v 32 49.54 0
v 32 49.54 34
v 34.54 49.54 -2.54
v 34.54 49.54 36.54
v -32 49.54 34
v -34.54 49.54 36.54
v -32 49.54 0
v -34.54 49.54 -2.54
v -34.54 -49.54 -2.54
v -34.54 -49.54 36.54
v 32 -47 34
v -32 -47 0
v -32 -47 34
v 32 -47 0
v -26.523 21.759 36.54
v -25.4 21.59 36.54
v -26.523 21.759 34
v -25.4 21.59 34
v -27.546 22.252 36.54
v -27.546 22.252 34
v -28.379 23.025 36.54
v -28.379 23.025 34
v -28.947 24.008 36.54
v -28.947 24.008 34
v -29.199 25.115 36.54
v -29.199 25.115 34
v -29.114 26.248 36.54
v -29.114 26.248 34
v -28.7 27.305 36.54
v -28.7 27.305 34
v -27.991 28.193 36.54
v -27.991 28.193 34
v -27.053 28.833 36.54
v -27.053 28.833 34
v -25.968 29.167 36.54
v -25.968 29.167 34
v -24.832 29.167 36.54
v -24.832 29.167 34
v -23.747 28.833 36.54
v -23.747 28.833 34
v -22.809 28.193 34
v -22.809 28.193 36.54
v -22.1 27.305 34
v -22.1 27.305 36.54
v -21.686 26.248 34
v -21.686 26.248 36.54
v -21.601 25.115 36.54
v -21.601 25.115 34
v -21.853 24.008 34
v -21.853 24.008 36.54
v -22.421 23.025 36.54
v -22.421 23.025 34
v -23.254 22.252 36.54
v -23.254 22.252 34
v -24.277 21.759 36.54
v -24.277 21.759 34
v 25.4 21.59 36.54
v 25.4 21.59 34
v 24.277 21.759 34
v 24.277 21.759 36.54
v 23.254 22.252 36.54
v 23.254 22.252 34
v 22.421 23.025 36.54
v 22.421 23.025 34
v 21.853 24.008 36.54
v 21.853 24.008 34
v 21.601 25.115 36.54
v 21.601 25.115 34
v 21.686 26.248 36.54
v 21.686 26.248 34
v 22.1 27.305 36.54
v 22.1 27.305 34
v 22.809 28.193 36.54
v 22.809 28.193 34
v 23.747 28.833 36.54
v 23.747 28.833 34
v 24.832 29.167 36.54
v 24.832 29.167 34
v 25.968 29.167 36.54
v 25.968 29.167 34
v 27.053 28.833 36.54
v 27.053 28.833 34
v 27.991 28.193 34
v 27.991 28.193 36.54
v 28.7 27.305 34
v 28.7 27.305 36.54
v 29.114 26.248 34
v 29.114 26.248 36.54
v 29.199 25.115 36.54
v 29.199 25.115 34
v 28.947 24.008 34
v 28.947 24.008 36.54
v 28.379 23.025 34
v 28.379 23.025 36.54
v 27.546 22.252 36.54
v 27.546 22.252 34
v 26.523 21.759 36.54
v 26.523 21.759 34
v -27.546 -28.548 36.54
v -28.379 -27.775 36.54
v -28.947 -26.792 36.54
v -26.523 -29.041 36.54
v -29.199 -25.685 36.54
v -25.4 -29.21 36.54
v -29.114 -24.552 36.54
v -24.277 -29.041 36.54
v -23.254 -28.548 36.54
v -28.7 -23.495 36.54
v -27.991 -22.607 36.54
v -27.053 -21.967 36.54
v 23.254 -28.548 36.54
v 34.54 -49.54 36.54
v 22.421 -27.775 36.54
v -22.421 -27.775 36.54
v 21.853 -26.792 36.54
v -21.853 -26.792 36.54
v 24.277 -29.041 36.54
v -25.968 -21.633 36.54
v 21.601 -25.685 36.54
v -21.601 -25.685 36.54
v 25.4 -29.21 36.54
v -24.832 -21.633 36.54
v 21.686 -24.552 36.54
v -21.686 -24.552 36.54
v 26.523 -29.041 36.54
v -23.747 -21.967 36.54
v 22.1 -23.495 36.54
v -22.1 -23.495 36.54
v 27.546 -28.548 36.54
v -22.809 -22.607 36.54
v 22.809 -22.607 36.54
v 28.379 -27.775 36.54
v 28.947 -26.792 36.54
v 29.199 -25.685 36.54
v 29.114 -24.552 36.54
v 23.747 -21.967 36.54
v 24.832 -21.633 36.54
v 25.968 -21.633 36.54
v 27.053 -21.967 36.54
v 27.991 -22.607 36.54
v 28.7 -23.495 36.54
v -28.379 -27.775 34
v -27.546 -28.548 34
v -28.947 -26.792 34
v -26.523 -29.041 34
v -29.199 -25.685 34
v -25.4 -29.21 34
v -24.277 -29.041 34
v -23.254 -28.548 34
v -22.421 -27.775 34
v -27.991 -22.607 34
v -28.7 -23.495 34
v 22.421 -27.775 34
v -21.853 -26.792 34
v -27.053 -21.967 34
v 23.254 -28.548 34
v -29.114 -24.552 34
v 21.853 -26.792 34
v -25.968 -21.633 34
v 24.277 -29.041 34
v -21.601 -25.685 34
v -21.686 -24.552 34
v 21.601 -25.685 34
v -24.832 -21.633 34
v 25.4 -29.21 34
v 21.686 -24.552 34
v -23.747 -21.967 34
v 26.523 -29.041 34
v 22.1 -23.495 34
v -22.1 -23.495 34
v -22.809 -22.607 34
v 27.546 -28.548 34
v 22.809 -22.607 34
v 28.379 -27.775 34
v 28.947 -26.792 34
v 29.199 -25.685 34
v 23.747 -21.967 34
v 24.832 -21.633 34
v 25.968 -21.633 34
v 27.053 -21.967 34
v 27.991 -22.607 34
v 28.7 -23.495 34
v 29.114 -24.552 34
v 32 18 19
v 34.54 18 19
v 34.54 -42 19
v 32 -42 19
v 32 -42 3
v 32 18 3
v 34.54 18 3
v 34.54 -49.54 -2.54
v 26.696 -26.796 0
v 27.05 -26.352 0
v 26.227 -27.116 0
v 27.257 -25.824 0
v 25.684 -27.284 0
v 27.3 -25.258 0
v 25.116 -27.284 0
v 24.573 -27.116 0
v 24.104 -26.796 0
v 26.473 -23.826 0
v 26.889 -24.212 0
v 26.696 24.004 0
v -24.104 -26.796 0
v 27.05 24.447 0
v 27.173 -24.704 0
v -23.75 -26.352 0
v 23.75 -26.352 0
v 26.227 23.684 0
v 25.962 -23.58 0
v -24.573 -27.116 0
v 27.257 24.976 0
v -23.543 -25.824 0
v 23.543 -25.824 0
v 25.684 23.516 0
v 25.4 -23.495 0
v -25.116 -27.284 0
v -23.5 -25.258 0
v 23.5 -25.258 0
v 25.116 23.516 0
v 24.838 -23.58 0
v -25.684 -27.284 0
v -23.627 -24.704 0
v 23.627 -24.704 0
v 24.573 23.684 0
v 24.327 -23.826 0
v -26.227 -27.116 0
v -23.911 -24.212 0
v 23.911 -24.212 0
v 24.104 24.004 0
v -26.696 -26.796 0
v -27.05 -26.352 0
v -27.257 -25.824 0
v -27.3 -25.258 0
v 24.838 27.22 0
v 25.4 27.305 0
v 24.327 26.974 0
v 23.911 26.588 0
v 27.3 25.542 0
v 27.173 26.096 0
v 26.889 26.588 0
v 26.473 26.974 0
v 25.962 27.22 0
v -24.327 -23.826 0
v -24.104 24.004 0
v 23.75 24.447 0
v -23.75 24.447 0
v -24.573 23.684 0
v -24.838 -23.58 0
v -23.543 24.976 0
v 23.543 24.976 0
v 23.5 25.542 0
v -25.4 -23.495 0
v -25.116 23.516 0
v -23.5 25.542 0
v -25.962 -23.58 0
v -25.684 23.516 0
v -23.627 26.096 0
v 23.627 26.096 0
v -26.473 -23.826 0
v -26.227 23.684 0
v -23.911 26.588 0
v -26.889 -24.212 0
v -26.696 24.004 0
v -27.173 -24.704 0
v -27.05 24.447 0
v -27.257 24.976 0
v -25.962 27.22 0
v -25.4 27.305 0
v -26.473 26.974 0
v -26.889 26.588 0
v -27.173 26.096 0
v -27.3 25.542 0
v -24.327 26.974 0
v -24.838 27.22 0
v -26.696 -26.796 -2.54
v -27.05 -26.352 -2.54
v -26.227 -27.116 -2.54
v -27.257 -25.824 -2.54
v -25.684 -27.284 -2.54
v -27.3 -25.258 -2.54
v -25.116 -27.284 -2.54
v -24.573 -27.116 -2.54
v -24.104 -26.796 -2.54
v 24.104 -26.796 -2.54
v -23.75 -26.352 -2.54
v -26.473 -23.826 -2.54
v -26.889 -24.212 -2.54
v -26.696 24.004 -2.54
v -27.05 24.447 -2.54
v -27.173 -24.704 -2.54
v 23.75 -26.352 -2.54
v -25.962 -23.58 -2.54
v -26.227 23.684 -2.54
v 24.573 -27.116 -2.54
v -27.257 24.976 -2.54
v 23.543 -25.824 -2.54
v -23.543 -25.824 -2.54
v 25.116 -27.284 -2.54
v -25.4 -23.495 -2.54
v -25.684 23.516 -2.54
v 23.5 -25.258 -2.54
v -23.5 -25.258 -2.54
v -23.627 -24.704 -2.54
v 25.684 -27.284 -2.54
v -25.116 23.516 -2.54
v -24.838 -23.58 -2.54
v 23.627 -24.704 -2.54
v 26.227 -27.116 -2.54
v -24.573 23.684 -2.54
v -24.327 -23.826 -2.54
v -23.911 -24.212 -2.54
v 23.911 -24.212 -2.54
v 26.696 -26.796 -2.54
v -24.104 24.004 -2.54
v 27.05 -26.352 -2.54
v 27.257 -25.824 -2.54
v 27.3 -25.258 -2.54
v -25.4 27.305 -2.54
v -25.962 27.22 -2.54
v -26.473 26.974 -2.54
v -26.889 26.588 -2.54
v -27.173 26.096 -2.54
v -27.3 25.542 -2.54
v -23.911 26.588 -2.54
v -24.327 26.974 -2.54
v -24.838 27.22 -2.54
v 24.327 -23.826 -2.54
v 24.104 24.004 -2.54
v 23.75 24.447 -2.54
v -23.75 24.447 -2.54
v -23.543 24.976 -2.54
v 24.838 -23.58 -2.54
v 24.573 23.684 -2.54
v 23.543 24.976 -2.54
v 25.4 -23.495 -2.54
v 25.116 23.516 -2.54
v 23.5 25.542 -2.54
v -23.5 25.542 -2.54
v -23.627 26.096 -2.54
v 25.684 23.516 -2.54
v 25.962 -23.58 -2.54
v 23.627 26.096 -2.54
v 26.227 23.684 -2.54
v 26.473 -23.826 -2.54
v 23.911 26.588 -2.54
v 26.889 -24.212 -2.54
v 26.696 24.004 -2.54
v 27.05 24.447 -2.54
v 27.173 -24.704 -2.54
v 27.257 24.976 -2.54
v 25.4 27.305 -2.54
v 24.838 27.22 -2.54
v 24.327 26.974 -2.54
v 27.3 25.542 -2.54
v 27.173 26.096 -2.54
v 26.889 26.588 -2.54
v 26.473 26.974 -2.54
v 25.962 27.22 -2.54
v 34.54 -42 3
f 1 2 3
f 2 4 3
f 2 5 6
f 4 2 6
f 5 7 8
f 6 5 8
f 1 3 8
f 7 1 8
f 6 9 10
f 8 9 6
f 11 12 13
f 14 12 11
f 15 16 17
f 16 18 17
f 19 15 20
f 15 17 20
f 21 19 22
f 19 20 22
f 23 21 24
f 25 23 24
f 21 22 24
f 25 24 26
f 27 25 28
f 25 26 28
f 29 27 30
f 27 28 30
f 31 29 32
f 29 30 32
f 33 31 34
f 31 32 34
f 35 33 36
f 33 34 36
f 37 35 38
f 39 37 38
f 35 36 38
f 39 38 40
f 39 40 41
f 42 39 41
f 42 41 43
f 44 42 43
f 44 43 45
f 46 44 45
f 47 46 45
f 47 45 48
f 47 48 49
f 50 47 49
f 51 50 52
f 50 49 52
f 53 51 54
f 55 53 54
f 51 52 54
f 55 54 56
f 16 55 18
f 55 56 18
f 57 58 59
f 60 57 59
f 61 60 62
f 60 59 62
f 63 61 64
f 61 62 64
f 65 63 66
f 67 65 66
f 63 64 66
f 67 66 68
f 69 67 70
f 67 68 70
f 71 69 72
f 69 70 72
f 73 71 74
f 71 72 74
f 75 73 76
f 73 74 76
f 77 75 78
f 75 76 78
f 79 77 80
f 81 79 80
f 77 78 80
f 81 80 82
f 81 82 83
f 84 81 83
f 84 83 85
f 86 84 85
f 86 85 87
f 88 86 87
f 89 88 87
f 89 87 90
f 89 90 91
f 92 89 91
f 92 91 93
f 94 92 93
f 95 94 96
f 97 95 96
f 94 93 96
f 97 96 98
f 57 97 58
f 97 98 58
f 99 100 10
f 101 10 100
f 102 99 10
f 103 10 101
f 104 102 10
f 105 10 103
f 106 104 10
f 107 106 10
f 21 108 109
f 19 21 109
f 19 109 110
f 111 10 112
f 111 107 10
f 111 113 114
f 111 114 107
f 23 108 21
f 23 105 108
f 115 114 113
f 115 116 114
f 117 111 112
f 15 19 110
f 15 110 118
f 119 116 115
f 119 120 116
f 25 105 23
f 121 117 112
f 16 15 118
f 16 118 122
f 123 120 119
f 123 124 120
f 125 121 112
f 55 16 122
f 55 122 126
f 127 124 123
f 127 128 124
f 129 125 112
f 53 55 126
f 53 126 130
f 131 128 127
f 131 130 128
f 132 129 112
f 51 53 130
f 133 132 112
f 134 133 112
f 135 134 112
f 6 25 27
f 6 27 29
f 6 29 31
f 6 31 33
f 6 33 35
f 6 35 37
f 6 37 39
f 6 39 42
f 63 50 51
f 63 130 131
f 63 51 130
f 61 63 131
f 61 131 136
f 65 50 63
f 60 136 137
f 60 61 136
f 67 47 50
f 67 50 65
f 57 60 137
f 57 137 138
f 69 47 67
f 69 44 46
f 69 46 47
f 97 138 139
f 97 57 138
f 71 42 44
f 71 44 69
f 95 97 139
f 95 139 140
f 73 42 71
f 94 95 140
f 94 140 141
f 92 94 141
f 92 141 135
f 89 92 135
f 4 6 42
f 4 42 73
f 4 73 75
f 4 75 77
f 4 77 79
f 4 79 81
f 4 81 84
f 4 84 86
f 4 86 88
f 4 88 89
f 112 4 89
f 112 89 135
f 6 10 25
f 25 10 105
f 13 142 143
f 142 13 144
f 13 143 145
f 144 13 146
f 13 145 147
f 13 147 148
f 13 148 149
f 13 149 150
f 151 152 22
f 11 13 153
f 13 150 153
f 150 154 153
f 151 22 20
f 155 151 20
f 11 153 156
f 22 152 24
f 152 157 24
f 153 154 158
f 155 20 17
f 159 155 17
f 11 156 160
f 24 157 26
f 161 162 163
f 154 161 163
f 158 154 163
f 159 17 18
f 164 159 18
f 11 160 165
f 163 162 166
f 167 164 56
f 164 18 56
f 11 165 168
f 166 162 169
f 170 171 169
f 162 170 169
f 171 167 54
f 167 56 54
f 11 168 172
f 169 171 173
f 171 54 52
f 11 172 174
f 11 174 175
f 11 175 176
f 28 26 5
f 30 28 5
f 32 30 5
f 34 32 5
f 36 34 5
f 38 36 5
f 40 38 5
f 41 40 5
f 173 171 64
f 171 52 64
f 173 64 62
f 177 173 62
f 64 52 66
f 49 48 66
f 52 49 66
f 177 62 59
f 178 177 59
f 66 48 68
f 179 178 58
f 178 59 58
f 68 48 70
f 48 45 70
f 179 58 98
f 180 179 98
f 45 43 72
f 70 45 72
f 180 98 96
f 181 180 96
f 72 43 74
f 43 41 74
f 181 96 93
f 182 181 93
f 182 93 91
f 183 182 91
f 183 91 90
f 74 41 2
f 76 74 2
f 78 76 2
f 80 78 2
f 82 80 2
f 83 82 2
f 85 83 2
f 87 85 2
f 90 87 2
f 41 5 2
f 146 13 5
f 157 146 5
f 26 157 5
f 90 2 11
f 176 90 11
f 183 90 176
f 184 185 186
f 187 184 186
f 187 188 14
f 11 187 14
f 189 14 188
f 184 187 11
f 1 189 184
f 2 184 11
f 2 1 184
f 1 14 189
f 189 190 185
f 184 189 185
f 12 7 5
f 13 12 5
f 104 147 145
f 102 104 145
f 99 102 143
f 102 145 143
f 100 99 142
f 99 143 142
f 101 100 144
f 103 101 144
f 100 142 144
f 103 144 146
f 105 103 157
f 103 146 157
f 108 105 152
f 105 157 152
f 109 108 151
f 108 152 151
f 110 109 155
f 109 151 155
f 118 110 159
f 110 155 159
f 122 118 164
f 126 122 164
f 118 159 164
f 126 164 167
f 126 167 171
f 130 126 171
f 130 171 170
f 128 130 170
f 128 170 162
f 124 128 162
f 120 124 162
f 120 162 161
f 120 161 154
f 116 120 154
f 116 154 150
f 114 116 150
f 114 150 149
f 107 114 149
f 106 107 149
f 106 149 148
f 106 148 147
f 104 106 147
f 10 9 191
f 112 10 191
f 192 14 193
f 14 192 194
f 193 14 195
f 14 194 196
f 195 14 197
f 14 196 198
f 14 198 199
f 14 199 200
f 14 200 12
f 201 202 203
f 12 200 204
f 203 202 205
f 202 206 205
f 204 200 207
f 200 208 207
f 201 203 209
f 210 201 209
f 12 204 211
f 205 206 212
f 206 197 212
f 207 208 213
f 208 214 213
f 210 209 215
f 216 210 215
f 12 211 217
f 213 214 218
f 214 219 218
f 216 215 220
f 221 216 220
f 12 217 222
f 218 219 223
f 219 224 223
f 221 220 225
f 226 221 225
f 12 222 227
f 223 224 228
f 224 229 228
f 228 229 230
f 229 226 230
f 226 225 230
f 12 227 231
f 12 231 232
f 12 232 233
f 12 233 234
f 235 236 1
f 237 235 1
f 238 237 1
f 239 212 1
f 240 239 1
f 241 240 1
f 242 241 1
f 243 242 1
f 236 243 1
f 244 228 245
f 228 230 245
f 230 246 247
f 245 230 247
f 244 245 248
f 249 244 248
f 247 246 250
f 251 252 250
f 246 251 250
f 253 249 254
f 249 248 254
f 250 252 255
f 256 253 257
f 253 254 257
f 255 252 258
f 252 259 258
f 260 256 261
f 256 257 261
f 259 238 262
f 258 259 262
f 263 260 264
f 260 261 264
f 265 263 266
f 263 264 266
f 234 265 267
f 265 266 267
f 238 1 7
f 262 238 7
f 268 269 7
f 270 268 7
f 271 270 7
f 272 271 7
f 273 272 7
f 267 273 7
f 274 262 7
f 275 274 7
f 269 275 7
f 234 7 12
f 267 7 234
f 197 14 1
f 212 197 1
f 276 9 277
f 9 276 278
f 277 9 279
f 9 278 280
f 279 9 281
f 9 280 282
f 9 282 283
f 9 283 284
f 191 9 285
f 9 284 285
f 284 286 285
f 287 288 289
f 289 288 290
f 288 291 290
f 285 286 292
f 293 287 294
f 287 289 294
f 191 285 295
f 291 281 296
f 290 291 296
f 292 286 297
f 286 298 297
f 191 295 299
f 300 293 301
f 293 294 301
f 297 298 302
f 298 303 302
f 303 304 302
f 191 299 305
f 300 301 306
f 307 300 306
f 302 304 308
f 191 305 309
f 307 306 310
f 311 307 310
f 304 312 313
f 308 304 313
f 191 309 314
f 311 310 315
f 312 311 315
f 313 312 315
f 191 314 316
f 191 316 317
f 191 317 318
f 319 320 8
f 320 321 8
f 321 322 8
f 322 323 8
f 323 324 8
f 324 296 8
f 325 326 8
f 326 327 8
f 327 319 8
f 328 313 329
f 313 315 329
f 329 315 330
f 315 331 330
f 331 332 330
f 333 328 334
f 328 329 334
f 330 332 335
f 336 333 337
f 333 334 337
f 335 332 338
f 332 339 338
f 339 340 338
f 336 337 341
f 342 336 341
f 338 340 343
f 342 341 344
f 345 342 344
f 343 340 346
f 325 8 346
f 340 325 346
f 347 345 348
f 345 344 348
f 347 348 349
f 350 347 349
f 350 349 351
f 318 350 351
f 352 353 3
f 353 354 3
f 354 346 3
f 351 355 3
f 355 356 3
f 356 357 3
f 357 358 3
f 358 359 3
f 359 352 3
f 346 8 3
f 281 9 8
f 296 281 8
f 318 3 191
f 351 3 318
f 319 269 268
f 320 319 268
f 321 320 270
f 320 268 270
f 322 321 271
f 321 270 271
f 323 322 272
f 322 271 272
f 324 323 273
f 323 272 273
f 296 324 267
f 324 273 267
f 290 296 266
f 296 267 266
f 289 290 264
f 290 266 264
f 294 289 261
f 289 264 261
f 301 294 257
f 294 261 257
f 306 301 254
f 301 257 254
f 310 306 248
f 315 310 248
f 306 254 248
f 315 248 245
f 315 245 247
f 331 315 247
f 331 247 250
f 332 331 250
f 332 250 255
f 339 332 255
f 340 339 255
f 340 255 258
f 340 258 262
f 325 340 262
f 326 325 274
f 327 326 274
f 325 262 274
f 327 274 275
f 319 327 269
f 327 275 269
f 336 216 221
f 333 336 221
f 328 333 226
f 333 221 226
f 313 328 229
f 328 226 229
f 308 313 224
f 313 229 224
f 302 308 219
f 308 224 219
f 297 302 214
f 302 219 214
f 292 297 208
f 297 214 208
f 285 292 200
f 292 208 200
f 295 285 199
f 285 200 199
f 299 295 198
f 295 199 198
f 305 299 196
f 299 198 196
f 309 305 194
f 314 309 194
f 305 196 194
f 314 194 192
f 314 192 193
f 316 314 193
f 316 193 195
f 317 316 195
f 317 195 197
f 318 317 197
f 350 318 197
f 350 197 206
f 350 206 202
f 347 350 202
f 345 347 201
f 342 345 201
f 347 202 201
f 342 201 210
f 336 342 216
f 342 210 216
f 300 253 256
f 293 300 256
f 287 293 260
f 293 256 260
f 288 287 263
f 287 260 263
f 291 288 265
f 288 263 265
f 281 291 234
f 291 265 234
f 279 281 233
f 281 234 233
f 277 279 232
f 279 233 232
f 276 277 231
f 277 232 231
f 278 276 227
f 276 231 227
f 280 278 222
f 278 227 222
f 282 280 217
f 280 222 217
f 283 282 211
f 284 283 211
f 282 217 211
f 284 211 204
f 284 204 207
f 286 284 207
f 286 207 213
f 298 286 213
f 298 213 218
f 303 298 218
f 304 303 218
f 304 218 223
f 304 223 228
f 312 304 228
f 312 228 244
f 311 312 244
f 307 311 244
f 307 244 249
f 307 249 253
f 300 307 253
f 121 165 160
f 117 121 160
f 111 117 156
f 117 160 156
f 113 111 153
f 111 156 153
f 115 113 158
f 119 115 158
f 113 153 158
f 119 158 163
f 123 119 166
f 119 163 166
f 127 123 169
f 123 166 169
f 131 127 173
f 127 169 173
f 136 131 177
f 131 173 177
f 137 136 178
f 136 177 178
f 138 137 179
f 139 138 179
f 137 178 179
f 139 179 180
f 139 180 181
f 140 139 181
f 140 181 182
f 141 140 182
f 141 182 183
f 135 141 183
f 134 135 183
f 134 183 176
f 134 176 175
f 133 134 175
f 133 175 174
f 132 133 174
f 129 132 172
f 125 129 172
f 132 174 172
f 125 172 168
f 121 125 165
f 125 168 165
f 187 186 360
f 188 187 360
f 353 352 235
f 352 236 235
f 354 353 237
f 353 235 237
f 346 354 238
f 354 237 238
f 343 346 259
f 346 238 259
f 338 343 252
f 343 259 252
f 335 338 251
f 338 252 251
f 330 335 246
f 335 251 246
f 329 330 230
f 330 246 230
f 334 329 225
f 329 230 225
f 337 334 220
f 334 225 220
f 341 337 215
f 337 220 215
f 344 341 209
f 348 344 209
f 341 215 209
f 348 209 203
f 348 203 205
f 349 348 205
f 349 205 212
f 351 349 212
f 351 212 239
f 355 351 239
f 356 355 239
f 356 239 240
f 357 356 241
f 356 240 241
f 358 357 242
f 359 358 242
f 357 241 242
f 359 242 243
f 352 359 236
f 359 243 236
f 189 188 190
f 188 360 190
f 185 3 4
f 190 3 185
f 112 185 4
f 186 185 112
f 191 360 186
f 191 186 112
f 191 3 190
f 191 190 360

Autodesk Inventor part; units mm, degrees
ref_plane "YZ Plane" through (0, 0, 0) normal (1, 0, 0) x (0, 1, 0)
ref_plane "XZ Plane" through (0, 0, 0) normal (0, 1, 0) x (-1, 0, 0)
ref_plane "XY Plane" through (0, 0, 0) normal (0, 0, 1) x (1, 0, 0)
sketch "Sketch14" plane through (0, 0, 0) normal (0, 0, 1) x (1, 0, 0)
  line L0 (-34.54, -49.54) -> (34.54, -49.54)
  line L1 (34.54, -49.54) -> (34.54, 49.54)
  line L2 (34.54, 49.54) -> (-34.54, 49.54)
  line L3 (-34.54, 49.54) -> (-34.54, -49.54)
  line L4 (-34.54, -49.54) -> (34.54, 49.54) construction
  line L5 (34.54, -49.54) -> (-34.54, 49.54) construction
  point P0 (0, 0)
  dimension "d66" = 69.08
  dimension "d67" = 99.08
extrude "Extrusion9" add sketch "Sketch14" against normal blind 2.54
sketch "Sketch15" plane through (0, 0, 0) normal (0, 0, 1) x (1, 0, 0)
  line L0 (-34.54, -49.54) -> (-34.54, 49.54) projected
  line L1 (34.54, 49.54) -> (34.54, -49.54) projected
  line L2 (-34.54, -49.54) -> (34.54, -49.54)
  line L3 (34.54, -49.54) -> (34.54, 49.54)
  line L4 (34.54, 49.54) -> (-34.54, 49.54)
  line L5 (-34.54, 49.54) -> (-34.54, -49.54)
  line L6 (-32, -47) -> (32, -47)
  line L7 (32, -47) -> (32, 47)
  line L8 (32, 47) -> (-32, 47)
  line L9 (-32, 47) -> (-32, -47)
  line L10 (-32, -47) -> (32, 47) construction
  line L11 (32, -47) -> (-32, 47) construction
  point P0 (0, 0)
  point P1 (34.54, -49.54)
  dimension "d70" = 64
  dimension "d71" = 94
extrude "Extrusion10" add sketch "Sketch15" along normal blind 34
sketch "Sketch16" plane through (0, 0, 34) normal (0, 0, 1) x (1, 0, 0)
  line L0 (-34.54, -49.54) -> (-34.54, 49.54) projected
  line L1 (34.54, 49.54) -> (34.54, -49.54) projected
  line L2 (-34.54, -49.54) -> (34.54, -49.54)
  line L3 (34.54, -49.54) -> (34.54, 49.54)
  line L4 (34.54, 49.54) -> (-34.54, 49.54)
  line L5 (-34.54, 49.54) -> (-34.54, -49.54)
  point P0 (0, 0)
  point P1 (34.54, -49.54)
extrude "Extrusion11" add sketch "Sketch16" along normal blind 2.54
sketch "Sketch17" plane through (-34.54, 49.54, -2.54) normal (0, 1, 0) x (1, 0, 0)
  line L0 (66.54, -2.54) -> (66.54, -36.54) projected
  line L1 (2.54, -36.54) -> (66.54, -36.54) projected
  line L2 (2.54, -2.54) -> (2.54, -36.54) projected
  line L3 (66.54, -2.54) -> (2.54, -2.54) projected
  line L4 (2.54, -36.54) -> (66.54, -36.54)
  line L5 (66.54, -36.54) -> (66.54, -2.54)
  line L6 (66.54, -2.54) -> (2.54, -2.54)
  line L7 (2.54, -2.54) -> (2.54, -36.54)
  point P0 (34.54, -2.54)
extrude "Extrusion12" cut sketch "Sketch17" against normal blind 2.54
sketch "Sketch18" plane through (34.54, -49.54, -2.54) normal (1, 0, 0) x (0, 0, -1)
  line L0 (-2.54, 2.54) -> (-2.54, 99.08) projected
  line L1 (-36.54, 99.08) -> (-36.54, 2.54) projected
  line L2 (-2.54, 2.54) -> (-36.54, 2.54) projected
  line L3 (-21.54, 7.54) -> (-5.54, 7.54)
  line L4 (-5.54, 7.54) -> (-5.54, 67.54)
  line L5 (-5.54, 67.54) -> (-21.54, 67.54)
  line L6 (-21.54, 67.54) -> (-21.54, 7.54)
  line L7 (-21.54, 7.54) -> (-5.54, 67.54) construction
  line L8 (-5.54, 7.54) -> (-21.54, 67.54) construction
  line L9 (-39.08, 0) -> (-39.08, 99.08) projected
  point P0 (-2.54, 49.54)
  point P1 (-13.54, 37.54)
  dimension "d78" = 5
  dimension "d79" = 3
  dimension "d80" = 15
  dimension "d81" = 65
extrude "Extrusion13" cut sketch "Sketch18" against normal blind 2.54
sketch "Sketch19" plane through (0, 0, -2.54) normal (0, 0, -1) x (-1, 0, 0)
  line L0 (-25.4, -25.4) -> (25.4, -25.4) construction
  line L1 (25.4, -25.4) -> (25.4, 25.4) construction
  line L2 (25.4, 25.4) -> (-25.4, 25.4) construction
  line L3 (-25.4, 25.4) -> (-25.4, -25.4) construction
  line L4 (-25.4, -25.4) -> (25.4, 25.4) construction
  line L5 (25.4, -25.4) -> (-25.4, 25.4) construction
  point P0 (0, 0)
  dimension "d84" = 50.8
  dimension "d85" = 50.8
hole "Hole3" at (25.4, 25.4, -2.54) at (-25.4, 25.4, -2.54) at (-25.4, -25.4, -2.54) at (25.4, -25.4, -2.54) direction (0, 0, 1) diameter 3.81 end through all clearance for "Flat Head Machine Screw (82)" size "#6" standard "Ansi Unified Screw Threads"
sketch "Sketch22" plane through (0, 0, 36.54) normal (0, 0, 1) x (1, 0, 0)
  circle A0 centre (-25.4, 25.4) radius 1.905 projected
  circle A1 centre (25.4, 25.4) radius 1.905 projected
  circle A2 centre (25.4, -25.4) radius 1.905 projected
  circle A3 centre (-25.4, -25.4) radius 1.905 projected
  point P0 (0, 0)
hole "Hole4" at (-25.4, 25.4, 36.54) at (25.4, 25.4, 36.54) at (25.4, -25.4, 36.54) at (-25.4, -25.4, 36.54) direction (0, 0, -1) diameter 7.62 depth 2.54
equation "\"d66\" = piBoxExteriorWidth"
equation "\"d67\" = piBoxExteriorLength"
equation "\"d68\" = piBoxWallThickness"
equation "\"d70\" = piBoxInteriorWidth"
equation "\"d71\" = piBoxInteriorLength"
equation "\"d72\" = piBoxInteriorHeight"
equation "\"d74\" = piBoxWallThickness"
equation "\"d76\" = piBoxWallThickness"
equation "\"d82\" = piBoxWallThickness"
equation "\"piBoxInteriorLength\" = 94"
equation "\"piBoxInteriorWidth\" = 64"
equation "\"piBoxInteriorHeight\" = 34"
equation "\"piBoxThickness\" = 3.175"
equation "\"piBoxWallThickness\" = 2.54"
equation "\"piBoxExteriorLength\" = piBoxInteriorLength + 2 * piBoxWallThickness"
equation "\"piBoxExteriorHeight\" = piBoxInteriorHeight + piBoxWallThickness"
equation "\"piBoxExteriorWidth\" = piBoxInteriorWidth + 2 * piBoxWallThickness"
properties part number "piCaseAttachesToTripodClamp"
